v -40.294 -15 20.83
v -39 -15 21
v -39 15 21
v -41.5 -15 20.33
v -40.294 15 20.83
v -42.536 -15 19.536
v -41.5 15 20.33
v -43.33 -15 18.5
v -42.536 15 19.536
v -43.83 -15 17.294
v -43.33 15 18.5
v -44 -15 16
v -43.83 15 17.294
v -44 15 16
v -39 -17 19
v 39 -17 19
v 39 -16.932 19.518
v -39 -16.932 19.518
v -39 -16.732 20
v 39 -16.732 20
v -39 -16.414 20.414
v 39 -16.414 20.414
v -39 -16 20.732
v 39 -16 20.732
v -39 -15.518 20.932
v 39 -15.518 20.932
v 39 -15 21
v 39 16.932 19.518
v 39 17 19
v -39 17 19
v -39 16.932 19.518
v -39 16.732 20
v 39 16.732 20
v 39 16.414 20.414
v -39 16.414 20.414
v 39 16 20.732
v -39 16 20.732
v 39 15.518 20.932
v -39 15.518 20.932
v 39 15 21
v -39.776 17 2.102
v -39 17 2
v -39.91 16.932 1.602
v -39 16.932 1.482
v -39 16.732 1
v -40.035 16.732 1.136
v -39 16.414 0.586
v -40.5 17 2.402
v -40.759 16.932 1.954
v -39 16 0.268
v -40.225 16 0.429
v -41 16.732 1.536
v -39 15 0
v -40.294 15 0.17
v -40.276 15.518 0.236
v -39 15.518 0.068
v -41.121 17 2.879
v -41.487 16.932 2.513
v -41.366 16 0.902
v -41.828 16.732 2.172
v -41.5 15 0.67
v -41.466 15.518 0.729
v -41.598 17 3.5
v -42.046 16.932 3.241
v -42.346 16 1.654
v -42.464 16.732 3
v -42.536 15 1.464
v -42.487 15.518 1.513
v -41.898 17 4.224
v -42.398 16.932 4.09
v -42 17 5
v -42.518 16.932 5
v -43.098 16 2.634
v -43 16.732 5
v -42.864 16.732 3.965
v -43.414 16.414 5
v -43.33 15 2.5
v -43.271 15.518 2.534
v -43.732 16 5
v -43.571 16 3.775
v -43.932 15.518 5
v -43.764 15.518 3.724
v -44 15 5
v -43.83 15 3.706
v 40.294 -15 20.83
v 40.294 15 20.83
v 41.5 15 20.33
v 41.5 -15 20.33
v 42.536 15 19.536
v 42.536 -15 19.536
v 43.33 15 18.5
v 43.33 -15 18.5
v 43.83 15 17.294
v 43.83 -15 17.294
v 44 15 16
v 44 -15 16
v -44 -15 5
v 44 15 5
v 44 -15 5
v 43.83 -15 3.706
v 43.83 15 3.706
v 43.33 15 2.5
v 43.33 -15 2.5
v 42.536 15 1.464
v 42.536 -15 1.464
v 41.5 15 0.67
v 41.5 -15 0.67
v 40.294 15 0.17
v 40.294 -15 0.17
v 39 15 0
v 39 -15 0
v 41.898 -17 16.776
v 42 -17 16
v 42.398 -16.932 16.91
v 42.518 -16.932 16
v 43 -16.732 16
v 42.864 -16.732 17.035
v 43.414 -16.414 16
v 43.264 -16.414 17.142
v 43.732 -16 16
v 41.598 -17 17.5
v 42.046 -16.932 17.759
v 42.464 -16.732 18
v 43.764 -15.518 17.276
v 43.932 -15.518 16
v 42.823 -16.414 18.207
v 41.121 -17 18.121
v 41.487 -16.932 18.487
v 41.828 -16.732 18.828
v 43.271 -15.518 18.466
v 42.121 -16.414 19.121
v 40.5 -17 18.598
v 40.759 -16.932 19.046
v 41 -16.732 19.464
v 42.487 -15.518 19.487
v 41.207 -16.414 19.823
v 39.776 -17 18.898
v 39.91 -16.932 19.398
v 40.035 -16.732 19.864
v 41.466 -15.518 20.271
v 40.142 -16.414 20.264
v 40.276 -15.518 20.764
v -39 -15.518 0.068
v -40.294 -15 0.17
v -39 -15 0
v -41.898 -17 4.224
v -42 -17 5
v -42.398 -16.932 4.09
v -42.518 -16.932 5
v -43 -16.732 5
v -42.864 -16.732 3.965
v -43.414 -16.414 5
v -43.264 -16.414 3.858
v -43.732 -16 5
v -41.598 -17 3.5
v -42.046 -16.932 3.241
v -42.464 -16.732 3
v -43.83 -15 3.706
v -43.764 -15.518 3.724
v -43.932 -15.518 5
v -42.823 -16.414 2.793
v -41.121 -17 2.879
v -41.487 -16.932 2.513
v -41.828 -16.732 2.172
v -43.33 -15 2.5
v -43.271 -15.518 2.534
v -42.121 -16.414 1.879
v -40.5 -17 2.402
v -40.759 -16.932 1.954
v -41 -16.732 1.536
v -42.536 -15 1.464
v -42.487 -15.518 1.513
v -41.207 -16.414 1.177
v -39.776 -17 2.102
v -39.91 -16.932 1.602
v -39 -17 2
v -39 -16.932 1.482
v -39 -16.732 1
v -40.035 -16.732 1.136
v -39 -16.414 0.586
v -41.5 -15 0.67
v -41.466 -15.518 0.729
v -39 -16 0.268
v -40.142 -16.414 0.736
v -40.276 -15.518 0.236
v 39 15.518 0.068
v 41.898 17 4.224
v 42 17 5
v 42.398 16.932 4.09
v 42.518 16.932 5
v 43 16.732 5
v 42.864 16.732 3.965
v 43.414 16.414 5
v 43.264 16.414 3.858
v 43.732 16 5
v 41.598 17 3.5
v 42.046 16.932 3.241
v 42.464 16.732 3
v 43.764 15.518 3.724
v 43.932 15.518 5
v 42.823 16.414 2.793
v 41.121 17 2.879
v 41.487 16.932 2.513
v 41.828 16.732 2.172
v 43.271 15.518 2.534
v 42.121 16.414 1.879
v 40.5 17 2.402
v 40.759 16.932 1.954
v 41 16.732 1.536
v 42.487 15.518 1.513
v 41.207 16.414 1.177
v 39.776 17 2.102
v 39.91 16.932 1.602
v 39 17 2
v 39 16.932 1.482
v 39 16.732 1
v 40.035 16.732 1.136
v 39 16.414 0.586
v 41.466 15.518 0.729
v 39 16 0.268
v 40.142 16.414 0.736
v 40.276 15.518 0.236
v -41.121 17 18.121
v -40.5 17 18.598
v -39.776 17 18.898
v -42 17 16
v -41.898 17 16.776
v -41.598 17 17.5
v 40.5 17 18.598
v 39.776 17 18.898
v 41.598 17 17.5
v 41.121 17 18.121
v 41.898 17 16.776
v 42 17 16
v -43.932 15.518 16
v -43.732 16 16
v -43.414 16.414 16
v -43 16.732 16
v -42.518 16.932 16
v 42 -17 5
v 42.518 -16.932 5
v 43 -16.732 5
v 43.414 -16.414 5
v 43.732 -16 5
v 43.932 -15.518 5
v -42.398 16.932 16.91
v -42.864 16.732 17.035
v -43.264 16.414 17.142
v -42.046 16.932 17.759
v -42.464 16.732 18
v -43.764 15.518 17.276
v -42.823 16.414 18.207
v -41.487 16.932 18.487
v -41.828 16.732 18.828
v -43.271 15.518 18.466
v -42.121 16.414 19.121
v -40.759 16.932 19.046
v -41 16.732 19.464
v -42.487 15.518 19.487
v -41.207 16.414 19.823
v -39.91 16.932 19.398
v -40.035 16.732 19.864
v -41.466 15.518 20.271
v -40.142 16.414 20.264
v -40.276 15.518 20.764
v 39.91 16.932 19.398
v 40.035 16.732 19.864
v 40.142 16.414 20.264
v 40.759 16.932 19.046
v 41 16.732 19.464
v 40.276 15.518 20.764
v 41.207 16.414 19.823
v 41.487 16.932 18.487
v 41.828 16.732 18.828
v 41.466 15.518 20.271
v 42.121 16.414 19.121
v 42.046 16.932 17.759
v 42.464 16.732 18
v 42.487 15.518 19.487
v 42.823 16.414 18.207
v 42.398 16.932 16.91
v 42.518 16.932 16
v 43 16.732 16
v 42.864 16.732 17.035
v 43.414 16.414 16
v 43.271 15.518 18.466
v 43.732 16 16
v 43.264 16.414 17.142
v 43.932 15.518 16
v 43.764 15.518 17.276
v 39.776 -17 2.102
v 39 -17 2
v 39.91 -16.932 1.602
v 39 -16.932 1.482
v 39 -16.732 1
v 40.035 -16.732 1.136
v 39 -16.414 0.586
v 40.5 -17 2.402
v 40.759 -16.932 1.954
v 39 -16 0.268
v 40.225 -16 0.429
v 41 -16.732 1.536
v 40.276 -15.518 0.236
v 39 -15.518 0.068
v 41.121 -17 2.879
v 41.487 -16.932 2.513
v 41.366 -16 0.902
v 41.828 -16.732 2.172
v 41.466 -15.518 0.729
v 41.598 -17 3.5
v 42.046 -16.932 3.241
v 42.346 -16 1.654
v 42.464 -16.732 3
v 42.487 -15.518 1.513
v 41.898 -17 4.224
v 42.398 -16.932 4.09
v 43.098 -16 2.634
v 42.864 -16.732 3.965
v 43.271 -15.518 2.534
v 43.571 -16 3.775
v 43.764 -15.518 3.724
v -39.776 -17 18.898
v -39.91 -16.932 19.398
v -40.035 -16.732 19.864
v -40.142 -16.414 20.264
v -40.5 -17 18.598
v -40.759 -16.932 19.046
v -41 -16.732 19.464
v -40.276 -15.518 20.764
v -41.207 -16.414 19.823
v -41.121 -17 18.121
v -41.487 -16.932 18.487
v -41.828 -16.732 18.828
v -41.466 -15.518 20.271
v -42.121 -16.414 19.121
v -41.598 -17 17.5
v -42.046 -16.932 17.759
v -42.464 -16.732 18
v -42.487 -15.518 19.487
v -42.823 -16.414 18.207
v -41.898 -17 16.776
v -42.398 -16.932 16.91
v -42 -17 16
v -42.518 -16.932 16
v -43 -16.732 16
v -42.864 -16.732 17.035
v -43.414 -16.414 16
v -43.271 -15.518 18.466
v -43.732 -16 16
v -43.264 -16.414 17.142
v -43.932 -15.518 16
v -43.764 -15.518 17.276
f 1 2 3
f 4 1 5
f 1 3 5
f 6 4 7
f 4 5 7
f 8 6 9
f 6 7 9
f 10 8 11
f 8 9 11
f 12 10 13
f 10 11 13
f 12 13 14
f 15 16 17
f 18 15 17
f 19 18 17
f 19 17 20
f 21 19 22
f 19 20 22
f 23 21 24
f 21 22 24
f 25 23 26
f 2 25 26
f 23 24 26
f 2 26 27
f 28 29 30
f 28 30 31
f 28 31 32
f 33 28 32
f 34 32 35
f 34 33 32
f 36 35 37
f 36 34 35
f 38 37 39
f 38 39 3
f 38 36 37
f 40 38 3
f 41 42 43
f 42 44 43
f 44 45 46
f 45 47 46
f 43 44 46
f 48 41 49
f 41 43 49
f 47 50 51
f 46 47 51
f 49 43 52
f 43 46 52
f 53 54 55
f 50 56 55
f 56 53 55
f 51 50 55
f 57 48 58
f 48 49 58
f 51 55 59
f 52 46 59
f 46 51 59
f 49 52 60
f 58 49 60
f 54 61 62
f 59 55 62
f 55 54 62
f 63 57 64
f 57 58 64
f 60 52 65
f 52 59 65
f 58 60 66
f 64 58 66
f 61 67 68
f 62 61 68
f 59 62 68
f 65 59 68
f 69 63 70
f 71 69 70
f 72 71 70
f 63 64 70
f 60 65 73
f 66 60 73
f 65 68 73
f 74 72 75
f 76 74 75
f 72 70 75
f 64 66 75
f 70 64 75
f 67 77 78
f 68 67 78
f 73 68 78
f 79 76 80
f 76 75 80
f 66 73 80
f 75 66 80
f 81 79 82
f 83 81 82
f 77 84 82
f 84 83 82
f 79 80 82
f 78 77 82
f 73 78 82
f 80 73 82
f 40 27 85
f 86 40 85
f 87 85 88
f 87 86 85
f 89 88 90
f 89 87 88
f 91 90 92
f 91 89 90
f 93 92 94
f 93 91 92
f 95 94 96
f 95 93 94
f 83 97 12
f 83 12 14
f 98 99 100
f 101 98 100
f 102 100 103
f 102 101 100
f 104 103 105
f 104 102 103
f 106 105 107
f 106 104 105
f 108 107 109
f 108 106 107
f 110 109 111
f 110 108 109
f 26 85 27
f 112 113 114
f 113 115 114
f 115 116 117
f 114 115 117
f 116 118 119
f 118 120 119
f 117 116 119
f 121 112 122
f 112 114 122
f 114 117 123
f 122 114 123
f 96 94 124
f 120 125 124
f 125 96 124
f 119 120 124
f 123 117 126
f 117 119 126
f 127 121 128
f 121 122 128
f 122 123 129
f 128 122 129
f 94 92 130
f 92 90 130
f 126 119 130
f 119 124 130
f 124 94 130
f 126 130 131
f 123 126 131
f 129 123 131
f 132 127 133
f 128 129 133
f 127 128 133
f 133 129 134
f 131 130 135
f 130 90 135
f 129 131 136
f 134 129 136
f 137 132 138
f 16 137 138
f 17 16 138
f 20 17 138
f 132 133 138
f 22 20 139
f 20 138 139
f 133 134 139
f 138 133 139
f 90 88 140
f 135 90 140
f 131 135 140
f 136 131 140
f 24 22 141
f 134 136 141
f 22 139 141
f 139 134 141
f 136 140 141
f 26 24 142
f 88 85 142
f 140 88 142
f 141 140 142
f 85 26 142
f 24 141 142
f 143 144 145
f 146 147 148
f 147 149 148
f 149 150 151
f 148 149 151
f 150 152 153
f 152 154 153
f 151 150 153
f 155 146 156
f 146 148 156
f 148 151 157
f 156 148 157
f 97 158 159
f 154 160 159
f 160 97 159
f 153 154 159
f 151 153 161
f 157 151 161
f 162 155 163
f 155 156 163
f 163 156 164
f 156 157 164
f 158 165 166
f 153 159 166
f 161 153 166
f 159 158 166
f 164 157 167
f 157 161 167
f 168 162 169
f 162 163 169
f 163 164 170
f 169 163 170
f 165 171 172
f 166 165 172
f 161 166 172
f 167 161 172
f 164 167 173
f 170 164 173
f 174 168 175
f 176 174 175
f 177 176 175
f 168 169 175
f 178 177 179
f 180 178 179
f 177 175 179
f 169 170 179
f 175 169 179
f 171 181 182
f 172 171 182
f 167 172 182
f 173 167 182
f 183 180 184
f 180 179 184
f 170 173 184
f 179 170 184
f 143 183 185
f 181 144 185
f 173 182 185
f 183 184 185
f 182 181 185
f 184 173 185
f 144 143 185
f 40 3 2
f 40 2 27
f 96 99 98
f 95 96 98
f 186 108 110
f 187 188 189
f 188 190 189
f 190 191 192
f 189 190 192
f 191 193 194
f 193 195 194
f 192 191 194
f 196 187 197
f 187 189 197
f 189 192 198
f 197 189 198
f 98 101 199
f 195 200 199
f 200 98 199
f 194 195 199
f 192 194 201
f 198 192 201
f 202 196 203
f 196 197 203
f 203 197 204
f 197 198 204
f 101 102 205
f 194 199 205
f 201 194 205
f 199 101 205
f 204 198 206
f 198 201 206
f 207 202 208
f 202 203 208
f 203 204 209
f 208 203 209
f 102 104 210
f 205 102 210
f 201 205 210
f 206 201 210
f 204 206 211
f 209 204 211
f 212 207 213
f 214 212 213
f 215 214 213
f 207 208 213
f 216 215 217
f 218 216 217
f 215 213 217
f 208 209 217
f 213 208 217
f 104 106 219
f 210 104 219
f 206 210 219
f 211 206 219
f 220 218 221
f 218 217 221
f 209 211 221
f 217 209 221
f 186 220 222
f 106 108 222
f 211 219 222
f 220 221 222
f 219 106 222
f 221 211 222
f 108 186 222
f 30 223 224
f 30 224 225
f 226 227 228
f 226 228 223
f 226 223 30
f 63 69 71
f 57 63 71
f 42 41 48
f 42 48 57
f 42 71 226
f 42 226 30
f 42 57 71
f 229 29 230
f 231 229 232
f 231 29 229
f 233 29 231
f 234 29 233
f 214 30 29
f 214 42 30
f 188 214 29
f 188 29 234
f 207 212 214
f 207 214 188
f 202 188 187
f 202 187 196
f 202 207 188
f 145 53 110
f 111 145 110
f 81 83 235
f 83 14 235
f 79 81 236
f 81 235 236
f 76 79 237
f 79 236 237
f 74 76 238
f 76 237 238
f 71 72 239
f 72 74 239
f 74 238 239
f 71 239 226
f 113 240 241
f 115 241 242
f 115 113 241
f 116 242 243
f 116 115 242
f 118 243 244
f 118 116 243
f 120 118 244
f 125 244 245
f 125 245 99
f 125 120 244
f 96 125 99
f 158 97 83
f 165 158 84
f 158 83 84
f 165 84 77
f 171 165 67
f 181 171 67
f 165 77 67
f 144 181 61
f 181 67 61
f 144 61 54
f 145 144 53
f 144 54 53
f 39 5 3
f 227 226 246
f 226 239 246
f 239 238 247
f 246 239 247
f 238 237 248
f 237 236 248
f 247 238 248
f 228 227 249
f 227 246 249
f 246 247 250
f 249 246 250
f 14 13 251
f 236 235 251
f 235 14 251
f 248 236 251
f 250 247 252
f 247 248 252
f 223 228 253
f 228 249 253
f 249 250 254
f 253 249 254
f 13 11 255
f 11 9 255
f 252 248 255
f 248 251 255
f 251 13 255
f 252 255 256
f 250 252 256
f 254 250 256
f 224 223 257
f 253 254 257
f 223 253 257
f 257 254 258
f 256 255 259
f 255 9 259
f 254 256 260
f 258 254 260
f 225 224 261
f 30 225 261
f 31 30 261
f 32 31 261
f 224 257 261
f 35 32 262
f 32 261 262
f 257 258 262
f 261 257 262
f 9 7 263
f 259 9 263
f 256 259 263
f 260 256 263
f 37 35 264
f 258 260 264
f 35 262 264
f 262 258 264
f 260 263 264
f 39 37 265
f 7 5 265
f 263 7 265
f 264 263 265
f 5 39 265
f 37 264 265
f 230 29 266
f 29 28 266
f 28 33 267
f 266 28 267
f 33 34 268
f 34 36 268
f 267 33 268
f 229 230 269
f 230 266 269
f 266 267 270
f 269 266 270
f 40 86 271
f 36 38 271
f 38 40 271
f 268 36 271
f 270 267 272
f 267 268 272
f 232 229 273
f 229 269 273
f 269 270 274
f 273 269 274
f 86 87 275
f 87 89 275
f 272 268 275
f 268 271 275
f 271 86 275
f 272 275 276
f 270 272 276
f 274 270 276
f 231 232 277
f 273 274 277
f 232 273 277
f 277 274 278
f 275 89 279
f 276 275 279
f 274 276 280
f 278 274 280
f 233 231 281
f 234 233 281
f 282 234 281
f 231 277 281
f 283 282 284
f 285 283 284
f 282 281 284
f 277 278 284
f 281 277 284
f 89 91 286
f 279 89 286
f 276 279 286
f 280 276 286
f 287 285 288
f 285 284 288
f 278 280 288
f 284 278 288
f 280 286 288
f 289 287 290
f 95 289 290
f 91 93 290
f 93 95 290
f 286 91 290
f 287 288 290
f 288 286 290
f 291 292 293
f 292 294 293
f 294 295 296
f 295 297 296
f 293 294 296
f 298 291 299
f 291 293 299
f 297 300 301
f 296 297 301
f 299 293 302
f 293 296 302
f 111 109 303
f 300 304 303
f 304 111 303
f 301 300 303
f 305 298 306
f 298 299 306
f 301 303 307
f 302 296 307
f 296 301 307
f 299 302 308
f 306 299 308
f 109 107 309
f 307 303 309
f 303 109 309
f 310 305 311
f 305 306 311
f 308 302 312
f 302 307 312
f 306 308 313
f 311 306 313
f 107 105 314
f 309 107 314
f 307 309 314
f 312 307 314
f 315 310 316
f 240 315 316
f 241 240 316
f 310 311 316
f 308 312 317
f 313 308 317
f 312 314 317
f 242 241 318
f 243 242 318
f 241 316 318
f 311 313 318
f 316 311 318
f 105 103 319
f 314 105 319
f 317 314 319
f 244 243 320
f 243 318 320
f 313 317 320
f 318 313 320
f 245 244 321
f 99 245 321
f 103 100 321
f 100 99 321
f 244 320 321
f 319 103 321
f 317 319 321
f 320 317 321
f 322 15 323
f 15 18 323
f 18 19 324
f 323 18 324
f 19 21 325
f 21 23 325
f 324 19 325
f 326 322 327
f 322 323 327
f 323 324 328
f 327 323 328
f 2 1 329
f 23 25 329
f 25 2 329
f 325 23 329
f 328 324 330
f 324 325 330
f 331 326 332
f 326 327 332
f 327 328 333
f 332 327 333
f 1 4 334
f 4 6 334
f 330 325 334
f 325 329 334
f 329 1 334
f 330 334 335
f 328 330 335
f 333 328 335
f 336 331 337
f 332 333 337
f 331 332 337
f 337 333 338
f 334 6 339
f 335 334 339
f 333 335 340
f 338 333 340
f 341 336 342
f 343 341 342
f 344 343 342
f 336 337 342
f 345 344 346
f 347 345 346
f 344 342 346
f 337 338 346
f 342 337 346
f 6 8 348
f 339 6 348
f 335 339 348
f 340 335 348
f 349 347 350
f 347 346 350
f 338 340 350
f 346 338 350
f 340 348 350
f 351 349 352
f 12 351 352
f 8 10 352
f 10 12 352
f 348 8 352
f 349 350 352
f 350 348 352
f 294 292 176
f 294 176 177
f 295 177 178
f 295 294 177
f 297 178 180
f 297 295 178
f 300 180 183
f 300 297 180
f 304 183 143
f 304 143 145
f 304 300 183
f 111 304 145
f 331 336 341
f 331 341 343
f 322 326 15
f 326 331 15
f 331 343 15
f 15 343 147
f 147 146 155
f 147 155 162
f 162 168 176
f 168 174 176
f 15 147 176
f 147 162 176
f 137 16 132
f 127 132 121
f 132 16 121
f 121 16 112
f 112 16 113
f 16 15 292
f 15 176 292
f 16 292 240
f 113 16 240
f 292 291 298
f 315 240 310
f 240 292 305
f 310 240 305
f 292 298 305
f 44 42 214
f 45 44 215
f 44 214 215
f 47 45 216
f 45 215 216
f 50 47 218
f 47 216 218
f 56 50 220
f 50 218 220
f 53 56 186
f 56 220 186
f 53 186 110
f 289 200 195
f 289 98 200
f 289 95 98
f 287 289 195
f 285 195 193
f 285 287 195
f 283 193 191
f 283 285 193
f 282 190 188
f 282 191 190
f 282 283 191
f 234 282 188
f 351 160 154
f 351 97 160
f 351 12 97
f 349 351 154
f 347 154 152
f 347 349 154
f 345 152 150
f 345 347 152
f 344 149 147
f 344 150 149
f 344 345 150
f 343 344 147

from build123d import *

# Parameters (mm, degrees)
F0_W         = 88
F0_H         = 34
F1_DEPTH     = 21
F2_R         = 2
F3_T1_DEPTH  = 34
F3_T4_ANGLE  = 90
F3_T6_ANGLE  = 90
F3_T8_ANGLE  = 90
F3_T10_ANGLE = 90
F3_T12_ANGLE = 90
F3_T14_ANGLE = 90
F3_T16_ANGLE = 90
F3_T18_ANGLE = 90


# Not quite as in the source:
# - a fillet or chamfer that OpenCascade refuses, or shapes differently, is made with other operations: its cross-section is extruded or revolved along the edge and cut away or added


with BuildPart() as f1:
    # F0 (on Top) → F1 (new body)
    with BuildSketch(Plane.XY):
        Rectangle(F0_W, F0_H)
    extrude(amount=F1_DEPTH)

    # F2
    f2_edges = [f1.edges().sort_by_distance(p)[0] for p in [
        (0, -17, 21),
        (0, -17, 0),
        (0, 17, 21),
        (0, 17, 0),
        (-44, 17, 10.5),
        (-44, -17, 10.5),
        (44, 17, 10.5),
        (44, -17, 10.5),
    ]]
    fillet(f2_edges, radius=F2_R)

    # F3: fillet of radius 5 on 4 edges, made by hand

    # F3_s2 → F3_t1 (cut)
    with BuildSketch(Plane.XZ.offset(-17)):
        with BuildLine():
            ThreePointArc((44, 5), (42.5355339059, 1.4644660941), (39, 0))
            Line((39, 0), (44, 0))
            Line((44, 0), (44, 5))
        make_face()
        with BuildLine():
            ThreePointArc((39, 21), (42.5355339059, 19.5355339059), (44, 16))
            Line((44, 16), (44, 21))
            Line((44, 21), (39, 21))
        make_face()
        with BuildLine():
            ThreePointArc((-44, 5), (-42.5355339059, 1.4644660941), (-39, 0))
            Line((-39, 0), (-44, 0))
            Line((-44, 0), (-44, 5))
        make_face()
        with BuildLine():
            ThreePointArc((-39, 21), (-42.5355339059, 19.5355339059), (-44, 16))
            Line((-44, 16), (-44, 21))
            Line((-44, 21), (-39, 21))
        make_face()
    extrude(amount=F3_T1_DEPTH, mode=Mode.SUBTRACT)

    # F3_s3 → F3_t4 (revolve, cut)
    with BuildSketch(Plane.XY.offset(16)):
        with BuildLine():
            ThreePointArc((-42, 17), (-43.4142135624, 16.4142135624), (-44, 15))
            Line((-44, 15), (-44, 17))
            Line((-44, 17), (-42, 17))
        make_face()
    revolve(axis=Axis((-39, 17, 16), (0, 1, 0)), revolution_arc=F3_T4_ANGLE, mode=Mode.SUBTRACT)

    # F3_s5 → F3_t6 (revolve, cut)
    with BuildSketch(Plane.YZ.offset(-39)):
        with BuildLine():
            ThreePointArc((-17, 19), (-16.4142135624, 20.4142135624), (-15, 21))
            Line((-15, 21), (-17, 21))
            Line((-17, 21), (-17, 19))
        make_face()
    revolve(axis=Axis((-39, -17, 16), (0, -1, 0)), revolution_arc=F3_T6_ANGLE, mode=Mode.SUBTRACT)

    # F3_s7 → F3_t8 (revolve, cut)
    with BuildSketch(Plane.YZ.offset(-39)):
        with BuildLine():
            ThreePointArc((17, 2), (16.4142135624, 0.5857864376), (15, 0))
            Line((15, 0), (17, 0))
            Line((17, 0), (17, 2))
        make_face()
    revolve(axis=Axis((-39, 17, 5), (0, 1, 0)), revolution_arc=F3_T8_ANGLE, mode=Mode.SUBTRACT)

    # F3_s9 → F3_t10 (revolve, cut)
    with BuildSketch(Plane.XY.offset(5)):
        with BuildLine():
            ThreePointArc((-42, -17), (-43.4142135624, -16.4142135624), (-44, -15))
            Line((-44, -15), (-44, -17))
            Line((-44, -17), (-42, -17))
        make_face()
    revolve(axis=Axis((-39, -17, 5), (0, -1, 0)), revolution_arc=F3_T10_ANGLE, mode=Mode.SUBTRACT)

    # F3_s11 → F3_t12 (revolve, cut)
    with BuildSketch(Plane.XY.offset(16)):
        with BuildLine():
            ThreePointArc((42, -17), (43.4142135624, -16.4142135624), (44, -15))
            Line((44, -15), (44, -17))
            Line((44, -17), (42, -17))
        make_face()
    revolve(axis=Axis((39, -17, 16), (0, -1, 0)), revolution_arc=F3_T12_ANGLE, mode=Mode.SUBTRACT)

    # F3_s13 → F3_t14 (revolve, cut)
    with BuildSketch(Plane.YZ.offset(39)):
        with BuildLine():
            ThreePointArc((17, 19), (16.4142135624, 20.4142135624), (15, 21))
            Line((15, 21), (17, 21))
            Line((17, 21), (17, 19))
        make_face()
    revolve(axis=Axis((39, 17, 16), (0, 1, 0)), revolution_arc=F3_T14_ANGLE, mode=Mode.SUBTRACT)

    # F3_s15 → F3_t16 (revolve, cut)
    with BuildSketch(Plane.YZ.offset(39)):
        with BuildLine():
            ThreePointArc((-17, 2), (-16.4142135624, 0.5857864376), (-15, 0))
            Line((-15, 0), (-17, 0))
            Line((-17, 0), (-17, 2))
        make_face()
    revolve(axis=Axis((39, -17, 5), (0, -1, 0)), revolution_arc=F3_T16_ANGLE, mode=Mode.SUBTRACT)

    # F3_s17 → F3_t18 (revolve, cut)
    with BuildSketch(Plane.XY.offset(5)):
        with BuildLine():
            ThreePointArc((42, 17), (43.4142135624, 16.4142135624), (44, 15))
            Line((44, 15), (44, 17))
            Line((44, 17), (42, 17))
        make_face()
    revolve(axis=Axis((39, 17, 5), (0, 1, 0)), revolution_arc=F3_T18_ANGLE, mode=Mode.SUBTRACT)


solid = f1.part
